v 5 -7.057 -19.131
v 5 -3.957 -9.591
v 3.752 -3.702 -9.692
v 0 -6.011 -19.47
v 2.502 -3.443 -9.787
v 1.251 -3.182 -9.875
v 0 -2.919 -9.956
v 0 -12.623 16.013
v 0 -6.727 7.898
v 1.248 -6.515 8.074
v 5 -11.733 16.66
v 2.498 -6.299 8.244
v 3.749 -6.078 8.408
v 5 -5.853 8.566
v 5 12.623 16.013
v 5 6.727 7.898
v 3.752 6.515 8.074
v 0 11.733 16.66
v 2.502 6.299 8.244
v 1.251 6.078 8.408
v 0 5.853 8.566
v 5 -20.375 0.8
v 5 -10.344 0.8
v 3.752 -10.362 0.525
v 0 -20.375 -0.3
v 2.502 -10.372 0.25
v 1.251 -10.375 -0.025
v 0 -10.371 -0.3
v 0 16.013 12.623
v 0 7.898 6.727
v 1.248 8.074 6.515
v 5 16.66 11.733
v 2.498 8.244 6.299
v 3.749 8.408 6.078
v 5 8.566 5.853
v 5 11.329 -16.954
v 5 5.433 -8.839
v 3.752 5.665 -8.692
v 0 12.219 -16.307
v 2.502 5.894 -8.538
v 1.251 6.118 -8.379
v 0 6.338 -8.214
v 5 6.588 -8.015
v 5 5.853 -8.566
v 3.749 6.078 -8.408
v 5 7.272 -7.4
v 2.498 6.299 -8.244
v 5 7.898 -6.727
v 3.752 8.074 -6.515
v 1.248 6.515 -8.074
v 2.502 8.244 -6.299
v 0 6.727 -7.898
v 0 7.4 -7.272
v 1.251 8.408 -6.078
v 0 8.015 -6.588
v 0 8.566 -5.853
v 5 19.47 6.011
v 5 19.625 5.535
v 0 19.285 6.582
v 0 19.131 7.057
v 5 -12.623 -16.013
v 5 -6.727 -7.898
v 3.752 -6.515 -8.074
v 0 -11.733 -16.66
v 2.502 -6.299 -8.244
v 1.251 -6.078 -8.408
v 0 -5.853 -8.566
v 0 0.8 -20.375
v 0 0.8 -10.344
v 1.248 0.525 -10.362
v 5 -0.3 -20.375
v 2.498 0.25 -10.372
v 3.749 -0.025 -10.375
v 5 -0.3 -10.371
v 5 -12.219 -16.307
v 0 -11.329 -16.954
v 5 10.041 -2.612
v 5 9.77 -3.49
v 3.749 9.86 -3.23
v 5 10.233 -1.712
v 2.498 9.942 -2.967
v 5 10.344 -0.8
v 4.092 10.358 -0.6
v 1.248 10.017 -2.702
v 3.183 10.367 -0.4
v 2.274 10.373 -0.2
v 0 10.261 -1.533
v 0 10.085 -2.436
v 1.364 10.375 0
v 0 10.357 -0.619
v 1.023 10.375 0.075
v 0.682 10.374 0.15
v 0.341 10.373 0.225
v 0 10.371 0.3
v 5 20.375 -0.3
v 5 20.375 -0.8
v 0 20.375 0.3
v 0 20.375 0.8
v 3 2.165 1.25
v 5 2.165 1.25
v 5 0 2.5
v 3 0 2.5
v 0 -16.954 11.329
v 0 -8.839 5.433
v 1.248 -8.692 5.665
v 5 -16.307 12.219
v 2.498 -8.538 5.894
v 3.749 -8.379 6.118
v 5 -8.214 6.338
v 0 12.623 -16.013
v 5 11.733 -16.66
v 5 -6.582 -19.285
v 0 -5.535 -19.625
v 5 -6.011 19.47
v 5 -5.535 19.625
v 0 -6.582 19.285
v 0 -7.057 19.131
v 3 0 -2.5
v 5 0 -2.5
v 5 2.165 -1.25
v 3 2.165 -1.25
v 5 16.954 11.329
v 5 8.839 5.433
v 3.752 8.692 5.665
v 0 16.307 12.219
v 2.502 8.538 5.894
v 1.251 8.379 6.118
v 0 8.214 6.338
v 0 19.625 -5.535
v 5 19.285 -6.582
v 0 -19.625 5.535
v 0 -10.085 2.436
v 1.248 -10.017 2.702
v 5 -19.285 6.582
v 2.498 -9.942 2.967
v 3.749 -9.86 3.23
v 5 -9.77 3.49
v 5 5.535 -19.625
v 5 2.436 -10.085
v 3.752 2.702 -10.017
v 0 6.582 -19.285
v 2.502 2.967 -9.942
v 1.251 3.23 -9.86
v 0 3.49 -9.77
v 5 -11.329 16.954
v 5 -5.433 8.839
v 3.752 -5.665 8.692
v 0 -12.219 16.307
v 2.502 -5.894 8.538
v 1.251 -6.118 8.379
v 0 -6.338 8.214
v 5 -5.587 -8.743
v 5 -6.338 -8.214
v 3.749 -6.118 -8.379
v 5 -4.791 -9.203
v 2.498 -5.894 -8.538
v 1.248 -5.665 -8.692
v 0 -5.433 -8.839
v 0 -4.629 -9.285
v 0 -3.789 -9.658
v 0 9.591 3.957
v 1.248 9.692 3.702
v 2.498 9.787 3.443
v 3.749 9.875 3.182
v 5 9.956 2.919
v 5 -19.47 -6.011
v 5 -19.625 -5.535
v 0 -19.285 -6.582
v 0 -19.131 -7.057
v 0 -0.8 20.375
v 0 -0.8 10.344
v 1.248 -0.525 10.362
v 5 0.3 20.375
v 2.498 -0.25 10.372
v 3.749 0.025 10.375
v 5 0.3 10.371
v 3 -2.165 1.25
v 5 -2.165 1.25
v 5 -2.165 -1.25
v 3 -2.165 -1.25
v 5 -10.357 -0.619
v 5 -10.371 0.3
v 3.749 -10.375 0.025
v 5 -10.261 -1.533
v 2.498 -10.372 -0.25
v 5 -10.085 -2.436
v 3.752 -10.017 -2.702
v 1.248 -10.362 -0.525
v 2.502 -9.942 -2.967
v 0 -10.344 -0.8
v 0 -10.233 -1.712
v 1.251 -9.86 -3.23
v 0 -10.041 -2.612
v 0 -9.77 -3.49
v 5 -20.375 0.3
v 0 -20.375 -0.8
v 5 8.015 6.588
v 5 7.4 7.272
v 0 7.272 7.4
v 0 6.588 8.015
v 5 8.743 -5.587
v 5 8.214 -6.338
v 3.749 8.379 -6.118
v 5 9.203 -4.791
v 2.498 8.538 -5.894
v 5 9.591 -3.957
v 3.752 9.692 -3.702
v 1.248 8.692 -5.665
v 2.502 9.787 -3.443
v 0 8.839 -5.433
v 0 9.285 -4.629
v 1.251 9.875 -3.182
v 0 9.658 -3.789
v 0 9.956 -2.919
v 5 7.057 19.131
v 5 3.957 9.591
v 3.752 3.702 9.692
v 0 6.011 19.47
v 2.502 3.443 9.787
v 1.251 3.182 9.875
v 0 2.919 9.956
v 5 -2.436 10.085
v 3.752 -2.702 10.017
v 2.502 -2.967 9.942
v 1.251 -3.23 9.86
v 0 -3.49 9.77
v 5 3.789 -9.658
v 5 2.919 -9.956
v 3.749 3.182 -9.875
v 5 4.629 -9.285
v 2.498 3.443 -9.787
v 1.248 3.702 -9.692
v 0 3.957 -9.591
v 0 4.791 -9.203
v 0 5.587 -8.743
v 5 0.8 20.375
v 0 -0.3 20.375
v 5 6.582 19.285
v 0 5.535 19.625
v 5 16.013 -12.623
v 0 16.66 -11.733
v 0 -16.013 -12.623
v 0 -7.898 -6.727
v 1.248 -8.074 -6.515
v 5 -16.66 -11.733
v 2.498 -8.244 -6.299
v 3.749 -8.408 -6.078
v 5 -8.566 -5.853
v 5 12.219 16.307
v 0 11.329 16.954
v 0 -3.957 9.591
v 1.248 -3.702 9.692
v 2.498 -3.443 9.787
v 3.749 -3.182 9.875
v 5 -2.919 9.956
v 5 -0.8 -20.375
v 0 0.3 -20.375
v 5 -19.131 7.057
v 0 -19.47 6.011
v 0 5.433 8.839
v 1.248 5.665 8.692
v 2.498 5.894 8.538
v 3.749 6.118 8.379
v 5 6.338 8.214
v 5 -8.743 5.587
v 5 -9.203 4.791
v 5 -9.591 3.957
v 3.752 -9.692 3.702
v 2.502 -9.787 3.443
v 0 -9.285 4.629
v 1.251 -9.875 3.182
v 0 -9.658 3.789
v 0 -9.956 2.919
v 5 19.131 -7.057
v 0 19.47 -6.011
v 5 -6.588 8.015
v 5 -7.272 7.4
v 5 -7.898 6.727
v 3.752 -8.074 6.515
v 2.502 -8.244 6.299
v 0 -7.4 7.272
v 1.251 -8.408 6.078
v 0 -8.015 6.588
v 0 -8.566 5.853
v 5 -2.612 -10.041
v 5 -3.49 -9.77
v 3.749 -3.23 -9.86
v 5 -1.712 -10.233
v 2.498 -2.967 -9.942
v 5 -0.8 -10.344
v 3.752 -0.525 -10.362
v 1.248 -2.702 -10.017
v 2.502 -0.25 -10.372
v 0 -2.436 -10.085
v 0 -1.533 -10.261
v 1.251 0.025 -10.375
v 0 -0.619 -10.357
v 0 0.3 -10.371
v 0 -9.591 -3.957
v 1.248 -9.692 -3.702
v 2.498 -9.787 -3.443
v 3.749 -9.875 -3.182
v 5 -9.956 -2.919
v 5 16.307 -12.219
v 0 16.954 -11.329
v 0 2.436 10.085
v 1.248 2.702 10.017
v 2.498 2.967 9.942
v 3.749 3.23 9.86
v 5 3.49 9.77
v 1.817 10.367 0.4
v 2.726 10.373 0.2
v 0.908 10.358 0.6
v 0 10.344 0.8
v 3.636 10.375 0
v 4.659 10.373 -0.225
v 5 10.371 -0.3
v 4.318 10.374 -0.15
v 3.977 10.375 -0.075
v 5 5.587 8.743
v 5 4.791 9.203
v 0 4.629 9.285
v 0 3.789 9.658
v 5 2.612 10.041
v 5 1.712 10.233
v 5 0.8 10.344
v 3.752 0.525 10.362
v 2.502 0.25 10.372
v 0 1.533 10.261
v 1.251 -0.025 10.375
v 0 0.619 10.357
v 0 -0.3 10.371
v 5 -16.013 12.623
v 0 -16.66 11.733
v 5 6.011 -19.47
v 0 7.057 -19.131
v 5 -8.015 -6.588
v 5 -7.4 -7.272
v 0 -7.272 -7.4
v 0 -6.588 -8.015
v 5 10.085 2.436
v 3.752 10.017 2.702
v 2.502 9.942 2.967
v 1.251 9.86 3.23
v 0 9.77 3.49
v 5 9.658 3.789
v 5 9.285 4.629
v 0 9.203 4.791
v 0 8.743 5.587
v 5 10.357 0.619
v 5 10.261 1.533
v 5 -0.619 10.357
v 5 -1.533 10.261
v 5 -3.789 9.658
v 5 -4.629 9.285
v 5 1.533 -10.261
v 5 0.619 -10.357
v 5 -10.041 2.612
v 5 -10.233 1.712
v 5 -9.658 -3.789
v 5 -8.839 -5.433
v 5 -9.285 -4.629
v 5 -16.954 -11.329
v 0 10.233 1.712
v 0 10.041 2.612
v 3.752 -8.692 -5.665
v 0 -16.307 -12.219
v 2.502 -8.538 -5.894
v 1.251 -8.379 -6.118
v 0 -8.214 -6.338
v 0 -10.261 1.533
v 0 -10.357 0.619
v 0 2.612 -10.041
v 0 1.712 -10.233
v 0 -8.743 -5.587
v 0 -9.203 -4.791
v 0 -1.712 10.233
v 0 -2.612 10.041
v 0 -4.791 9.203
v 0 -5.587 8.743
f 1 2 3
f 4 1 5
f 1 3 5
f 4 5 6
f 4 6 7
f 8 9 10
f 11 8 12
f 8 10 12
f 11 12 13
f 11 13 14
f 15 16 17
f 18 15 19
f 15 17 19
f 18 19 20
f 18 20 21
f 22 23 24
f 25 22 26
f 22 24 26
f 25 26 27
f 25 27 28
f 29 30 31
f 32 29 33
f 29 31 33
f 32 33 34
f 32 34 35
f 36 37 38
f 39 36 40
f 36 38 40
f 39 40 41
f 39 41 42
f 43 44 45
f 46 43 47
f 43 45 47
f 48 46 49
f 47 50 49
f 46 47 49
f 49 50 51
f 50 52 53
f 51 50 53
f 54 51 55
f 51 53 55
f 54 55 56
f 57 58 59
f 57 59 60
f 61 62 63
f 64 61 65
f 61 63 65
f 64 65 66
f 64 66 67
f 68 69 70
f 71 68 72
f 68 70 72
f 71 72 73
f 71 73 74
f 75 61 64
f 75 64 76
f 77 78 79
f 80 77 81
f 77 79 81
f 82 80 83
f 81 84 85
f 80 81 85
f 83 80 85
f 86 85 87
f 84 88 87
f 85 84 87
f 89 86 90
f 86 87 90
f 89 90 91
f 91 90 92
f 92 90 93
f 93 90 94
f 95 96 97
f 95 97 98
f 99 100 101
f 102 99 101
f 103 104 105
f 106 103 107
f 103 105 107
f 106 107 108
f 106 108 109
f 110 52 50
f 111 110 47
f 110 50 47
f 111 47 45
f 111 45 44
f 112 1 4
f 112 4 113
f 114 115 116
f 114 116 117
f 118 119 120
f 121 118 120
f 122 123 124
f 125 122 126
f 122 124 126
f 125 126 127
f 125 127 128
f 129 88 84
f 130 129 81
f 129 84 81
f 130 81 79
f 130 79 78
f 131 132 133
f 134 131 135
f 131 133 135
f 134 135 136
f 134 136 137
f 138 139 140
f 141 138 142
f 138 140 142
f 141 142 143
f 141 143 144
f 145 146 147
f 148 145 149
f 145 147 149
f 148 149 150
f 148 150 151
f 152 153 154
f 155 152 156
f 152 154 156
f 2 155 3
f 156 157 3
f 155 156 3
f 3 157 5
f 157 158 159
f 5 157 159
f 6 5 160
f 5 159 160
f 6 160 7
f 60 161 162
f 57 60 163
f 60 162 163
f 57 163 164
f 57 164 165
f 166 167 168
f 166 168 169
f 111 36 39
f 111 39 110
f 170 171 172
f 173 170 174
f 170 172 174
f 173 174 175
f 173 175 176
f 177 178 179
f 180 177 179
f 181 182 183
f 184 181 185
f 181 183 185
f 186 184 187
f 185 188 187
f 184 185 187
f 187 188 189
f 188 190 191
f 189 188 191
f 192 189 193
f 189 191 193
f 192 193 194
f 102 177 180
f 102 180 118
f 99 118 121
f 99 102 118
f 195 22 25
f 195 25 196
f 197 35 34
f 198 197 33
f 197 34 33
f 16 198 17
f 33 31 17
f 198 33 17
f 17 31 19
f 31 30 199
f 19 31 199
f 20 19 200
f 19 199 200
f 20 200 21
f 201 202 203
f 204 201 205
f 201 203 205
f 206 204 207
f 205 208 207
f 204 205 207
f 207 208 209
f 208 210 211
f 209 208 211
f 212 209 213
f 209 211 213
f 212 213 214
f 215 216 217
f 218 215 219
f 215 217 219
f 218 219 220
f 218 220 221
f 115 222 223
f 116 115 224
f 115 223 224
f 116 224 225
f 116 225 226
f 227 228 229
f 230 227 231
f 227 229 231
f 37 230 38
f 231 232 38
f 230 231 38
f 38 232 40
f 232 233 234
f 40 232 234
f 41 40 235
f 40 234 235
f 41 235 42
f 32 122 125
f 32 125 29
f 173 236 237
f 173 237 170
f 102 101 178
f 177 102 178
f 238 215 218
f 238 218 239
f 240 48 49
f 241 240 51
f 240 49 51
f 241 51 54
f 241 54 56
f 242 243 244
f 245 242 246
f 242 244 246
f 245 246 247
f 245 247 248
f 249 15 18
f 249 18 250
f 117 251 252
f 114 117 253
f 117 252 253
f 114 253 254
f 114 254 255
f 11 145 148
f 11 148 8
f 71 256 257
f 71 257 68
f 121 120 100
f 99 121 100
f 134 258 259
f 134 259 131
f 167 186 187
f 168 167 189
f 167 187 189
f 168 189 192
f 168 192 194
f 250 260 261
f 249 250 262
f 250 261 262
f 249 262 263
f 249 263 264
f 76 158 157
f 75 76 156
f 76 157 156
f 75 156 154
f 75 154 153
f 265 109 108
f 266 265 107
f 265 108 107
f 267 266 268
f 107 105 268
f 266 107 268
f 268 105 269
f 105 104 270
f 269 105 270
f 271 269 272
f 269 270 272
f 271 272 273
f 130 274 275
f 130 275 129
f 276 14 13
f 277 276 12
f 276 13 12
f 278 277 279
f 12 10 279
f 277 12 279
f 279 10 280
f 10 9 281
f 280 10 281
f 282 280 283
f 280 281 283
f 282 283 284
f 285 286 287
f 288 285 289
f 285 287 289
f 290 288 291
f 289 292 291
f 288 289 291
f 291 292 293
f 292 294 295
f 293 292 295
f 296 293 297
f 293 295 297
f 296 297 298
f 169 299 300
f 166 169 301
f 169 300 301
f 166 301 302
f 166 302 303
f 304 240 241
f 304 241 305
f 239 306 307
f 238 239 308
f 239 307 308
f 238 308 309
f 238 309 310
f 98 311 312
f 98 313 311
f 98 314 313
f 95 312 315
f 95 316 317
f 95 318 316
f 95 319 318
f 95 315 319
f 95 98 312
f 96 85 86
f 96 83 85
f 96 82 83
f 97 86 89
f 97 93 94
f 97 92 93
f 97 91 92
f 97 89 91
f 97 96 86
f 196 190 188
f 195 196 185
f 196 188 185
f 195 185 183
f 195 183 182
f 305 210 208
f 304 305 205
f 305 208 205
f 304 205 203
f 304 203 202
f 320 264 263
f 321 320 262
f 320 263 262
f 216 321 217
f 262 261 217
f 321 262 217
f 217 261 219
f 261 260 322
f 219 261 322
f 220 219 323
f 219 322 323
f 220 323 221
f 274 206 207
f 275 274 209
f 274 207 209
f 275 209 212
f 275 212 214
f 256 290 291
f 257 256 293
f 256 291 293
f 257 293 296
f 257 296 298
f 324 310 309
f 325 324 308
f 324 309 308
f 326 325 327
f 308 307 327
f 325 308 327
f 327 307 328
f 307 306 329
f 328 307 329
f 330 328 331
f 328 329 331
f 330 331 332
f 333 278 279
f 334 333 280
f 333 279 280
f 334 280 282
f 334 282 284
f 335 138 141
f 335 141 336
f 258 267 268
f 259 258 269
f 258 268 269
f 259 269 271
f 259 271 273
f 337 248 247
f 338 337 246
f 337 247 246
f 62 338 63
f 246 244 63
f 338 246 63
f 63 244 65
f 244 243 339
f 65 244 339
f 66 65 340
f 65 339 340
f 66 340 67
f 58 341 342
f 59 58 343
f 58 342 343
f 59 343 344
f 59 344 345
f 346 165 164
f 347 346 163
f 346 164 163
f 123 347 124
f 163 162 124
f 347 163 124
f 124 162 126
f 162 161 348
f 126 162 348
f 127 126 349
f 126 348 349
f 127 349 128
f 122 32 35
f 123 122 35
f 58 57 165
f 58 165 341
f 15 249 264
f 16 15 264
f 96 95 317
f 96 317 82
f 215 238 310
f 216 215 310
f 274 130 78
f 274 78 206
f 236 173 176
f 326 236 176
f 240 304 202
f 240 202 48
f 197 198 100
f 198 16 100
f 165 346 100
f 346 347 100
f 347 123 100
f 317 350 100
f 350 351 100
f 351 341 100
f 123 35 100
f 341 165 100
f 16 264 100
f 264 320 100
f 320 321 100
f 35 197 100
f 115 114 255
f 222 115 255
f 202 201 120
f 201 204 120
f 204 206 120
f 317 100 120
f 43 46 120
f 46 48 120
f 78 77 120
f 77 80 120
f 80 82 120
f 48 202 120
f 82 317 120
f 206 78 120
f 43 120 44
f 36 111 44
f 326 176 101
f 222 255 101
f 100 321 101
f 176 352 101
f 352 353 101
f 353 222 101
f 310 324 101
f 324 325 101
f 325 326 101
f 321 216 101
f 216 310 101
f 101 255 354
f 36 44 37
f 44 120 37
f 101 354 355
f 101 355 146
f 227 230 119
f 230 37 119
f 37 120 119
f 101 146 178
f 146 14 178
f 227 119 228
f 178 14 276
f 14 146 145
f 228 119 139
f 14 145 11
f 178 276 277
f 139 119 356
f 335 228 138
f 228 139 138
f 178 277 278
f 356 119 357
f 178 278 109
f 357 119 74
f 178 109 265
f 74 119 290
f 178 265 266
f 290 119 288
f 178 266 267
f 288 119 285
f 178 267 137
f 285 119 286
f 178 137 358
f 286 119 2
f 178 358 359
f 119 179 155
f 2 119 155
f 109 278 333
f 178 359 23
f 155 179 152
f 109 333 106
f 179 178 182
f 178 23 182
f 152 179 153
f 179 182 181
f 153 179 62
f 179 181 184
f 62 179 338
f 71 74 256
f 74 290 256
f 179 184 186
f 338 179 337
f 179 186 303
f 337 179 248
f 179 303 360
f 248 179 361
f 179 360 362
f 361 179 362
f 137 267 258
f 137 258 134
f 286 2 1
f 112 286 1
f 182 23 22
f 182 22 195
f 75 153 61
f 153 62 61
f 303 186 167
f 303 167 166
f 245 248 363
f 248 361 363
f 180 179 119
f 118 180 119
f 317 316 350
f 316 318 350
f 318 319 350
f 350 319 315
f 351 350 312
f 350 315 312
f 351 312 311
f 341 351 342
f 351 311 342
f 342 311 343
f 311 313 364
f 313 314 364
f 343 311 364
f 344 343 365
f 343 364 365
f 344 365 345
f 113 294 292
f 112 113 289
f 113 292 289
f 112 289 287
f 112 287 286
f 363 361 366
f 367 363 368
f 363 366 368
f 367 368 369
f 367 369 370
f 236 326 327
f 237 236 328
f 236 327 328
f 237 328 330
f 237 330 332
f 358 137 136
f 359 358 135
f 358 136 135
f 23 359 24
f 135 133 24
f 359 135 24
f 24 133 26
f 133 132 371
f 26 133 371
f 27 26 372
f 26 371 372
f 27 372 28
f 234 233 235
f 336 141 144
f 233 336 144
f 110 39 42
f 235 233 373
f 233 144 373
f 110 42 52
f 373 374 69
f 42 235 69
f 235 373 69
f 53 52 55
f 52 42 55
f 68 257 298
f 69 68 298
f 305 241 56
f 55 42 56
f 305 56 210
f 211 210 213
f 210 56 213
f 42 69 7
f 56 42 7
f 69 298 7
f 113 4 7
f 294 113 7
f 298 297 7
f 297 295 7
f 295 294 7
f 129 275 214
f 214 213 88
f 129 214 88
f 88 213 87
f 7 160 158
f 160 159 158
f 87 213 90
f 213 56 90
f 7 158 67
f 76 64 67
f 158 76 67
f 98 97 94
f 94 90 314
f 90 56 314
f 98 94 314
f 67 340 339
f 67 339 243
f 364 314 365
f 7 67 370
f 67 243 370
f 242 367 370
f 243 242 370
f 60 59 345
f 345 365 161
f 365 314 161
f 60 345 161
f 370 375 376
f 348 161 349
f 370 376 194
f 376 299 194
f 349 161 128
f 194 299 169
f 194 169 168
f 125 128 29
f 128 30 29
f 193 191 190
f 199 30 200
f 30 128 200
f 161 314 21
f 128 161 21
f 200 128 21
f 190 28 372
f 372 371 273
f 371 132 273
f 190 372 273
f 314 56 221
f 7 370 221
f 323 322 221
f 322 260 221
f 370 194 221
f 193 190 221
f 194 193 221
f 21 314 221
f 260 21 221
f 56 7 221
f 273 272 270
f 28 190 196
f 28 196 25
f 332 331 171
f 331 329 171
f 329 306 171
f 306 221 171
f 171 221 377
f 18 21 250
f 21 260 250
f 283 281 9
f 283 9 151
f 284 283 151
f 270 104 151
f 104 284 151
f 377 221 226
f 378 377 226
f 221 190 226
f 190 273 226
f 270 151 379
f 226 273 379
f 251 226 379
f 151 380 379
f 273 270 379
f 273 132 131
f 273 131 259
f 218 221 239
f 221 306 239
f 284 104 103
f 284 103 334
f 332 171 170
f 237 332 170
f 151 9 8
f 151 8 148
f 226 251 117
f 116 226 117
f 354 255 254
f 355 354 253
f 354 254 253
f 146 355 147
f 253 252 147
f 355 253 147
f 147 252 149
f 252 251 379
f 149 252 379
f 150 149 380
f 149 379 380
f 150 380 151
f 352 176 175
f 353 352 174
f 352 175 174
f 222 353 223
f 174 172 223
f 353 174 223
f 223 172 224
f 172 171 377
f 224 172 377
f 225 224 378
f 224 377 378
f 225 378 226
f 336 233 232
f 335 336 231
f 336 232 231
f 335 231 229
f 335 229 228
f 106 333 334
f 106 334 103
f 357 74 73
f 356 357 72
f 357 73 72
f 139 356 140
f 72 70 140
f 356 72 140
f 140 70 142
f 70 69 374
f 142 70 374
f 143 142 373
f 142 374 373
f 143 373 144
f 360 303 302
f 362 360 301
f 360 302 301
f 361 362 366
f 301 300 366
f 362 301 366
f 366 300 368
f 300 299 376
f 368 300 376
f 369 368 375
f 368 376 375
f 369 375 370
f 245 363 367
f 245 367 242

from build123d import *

# Parameters (mm, degrees)
SKETCH_R           = 10.375
PAD_DEPTH          = 5
POCKET_DEPTH       = 2
PAD001_DEPTH       = 10
PAD001_DEPTH_BACK  = 1
POLARPATTERN_COUNT = 20


with BuildPart() as part:
    # Sketch → Pad (new body)
    with BuildSketch(Plane.YZ):
        Circle(SKETCH_R)
    extrude(amount=PAD_DEPTH)

    # Sketch001 (on Face3 of Pad) → Pocket (cut)
    with BuildSketch(Plane.YZ.offset(5)):
        Polygon((2.165064, 1.25), (0, 2.5), (-2.165064, 1.25), (-2.165064, -1.25), (0, -2.5), (2.165064, -1.25), align=None)
    extrude(amount=-POCKET_DEPTH, mode=Mode.SUBTRACT)

    # Sketch002 (on DatumPlane) → Pad001 (join, two sides)
    with BuildSketch(Plane.ZX.offset(10.375)) as pad001_sk:
        Polygon((0.8, 0), (-0.3, 5), (-0.8, 5), (0.3, 0), align=None)
    pad001 = extrude(amount=PAD001_DEPTH) + extrude(pad001_sk.sketch, amount=-PAD001_DEPTH_BACK)

    # PolarPattern: Pad001 ×20 about axis
    polarpattern_axis = Axis((0, 0, 0), (1, 0, 0))
    for i in range(1, POLARPATTERN_COUNT):
        add(pad001.rotate(polarpattern_axis, i * 360 / POLARPATTERN_COUNT))


solid = part.part
